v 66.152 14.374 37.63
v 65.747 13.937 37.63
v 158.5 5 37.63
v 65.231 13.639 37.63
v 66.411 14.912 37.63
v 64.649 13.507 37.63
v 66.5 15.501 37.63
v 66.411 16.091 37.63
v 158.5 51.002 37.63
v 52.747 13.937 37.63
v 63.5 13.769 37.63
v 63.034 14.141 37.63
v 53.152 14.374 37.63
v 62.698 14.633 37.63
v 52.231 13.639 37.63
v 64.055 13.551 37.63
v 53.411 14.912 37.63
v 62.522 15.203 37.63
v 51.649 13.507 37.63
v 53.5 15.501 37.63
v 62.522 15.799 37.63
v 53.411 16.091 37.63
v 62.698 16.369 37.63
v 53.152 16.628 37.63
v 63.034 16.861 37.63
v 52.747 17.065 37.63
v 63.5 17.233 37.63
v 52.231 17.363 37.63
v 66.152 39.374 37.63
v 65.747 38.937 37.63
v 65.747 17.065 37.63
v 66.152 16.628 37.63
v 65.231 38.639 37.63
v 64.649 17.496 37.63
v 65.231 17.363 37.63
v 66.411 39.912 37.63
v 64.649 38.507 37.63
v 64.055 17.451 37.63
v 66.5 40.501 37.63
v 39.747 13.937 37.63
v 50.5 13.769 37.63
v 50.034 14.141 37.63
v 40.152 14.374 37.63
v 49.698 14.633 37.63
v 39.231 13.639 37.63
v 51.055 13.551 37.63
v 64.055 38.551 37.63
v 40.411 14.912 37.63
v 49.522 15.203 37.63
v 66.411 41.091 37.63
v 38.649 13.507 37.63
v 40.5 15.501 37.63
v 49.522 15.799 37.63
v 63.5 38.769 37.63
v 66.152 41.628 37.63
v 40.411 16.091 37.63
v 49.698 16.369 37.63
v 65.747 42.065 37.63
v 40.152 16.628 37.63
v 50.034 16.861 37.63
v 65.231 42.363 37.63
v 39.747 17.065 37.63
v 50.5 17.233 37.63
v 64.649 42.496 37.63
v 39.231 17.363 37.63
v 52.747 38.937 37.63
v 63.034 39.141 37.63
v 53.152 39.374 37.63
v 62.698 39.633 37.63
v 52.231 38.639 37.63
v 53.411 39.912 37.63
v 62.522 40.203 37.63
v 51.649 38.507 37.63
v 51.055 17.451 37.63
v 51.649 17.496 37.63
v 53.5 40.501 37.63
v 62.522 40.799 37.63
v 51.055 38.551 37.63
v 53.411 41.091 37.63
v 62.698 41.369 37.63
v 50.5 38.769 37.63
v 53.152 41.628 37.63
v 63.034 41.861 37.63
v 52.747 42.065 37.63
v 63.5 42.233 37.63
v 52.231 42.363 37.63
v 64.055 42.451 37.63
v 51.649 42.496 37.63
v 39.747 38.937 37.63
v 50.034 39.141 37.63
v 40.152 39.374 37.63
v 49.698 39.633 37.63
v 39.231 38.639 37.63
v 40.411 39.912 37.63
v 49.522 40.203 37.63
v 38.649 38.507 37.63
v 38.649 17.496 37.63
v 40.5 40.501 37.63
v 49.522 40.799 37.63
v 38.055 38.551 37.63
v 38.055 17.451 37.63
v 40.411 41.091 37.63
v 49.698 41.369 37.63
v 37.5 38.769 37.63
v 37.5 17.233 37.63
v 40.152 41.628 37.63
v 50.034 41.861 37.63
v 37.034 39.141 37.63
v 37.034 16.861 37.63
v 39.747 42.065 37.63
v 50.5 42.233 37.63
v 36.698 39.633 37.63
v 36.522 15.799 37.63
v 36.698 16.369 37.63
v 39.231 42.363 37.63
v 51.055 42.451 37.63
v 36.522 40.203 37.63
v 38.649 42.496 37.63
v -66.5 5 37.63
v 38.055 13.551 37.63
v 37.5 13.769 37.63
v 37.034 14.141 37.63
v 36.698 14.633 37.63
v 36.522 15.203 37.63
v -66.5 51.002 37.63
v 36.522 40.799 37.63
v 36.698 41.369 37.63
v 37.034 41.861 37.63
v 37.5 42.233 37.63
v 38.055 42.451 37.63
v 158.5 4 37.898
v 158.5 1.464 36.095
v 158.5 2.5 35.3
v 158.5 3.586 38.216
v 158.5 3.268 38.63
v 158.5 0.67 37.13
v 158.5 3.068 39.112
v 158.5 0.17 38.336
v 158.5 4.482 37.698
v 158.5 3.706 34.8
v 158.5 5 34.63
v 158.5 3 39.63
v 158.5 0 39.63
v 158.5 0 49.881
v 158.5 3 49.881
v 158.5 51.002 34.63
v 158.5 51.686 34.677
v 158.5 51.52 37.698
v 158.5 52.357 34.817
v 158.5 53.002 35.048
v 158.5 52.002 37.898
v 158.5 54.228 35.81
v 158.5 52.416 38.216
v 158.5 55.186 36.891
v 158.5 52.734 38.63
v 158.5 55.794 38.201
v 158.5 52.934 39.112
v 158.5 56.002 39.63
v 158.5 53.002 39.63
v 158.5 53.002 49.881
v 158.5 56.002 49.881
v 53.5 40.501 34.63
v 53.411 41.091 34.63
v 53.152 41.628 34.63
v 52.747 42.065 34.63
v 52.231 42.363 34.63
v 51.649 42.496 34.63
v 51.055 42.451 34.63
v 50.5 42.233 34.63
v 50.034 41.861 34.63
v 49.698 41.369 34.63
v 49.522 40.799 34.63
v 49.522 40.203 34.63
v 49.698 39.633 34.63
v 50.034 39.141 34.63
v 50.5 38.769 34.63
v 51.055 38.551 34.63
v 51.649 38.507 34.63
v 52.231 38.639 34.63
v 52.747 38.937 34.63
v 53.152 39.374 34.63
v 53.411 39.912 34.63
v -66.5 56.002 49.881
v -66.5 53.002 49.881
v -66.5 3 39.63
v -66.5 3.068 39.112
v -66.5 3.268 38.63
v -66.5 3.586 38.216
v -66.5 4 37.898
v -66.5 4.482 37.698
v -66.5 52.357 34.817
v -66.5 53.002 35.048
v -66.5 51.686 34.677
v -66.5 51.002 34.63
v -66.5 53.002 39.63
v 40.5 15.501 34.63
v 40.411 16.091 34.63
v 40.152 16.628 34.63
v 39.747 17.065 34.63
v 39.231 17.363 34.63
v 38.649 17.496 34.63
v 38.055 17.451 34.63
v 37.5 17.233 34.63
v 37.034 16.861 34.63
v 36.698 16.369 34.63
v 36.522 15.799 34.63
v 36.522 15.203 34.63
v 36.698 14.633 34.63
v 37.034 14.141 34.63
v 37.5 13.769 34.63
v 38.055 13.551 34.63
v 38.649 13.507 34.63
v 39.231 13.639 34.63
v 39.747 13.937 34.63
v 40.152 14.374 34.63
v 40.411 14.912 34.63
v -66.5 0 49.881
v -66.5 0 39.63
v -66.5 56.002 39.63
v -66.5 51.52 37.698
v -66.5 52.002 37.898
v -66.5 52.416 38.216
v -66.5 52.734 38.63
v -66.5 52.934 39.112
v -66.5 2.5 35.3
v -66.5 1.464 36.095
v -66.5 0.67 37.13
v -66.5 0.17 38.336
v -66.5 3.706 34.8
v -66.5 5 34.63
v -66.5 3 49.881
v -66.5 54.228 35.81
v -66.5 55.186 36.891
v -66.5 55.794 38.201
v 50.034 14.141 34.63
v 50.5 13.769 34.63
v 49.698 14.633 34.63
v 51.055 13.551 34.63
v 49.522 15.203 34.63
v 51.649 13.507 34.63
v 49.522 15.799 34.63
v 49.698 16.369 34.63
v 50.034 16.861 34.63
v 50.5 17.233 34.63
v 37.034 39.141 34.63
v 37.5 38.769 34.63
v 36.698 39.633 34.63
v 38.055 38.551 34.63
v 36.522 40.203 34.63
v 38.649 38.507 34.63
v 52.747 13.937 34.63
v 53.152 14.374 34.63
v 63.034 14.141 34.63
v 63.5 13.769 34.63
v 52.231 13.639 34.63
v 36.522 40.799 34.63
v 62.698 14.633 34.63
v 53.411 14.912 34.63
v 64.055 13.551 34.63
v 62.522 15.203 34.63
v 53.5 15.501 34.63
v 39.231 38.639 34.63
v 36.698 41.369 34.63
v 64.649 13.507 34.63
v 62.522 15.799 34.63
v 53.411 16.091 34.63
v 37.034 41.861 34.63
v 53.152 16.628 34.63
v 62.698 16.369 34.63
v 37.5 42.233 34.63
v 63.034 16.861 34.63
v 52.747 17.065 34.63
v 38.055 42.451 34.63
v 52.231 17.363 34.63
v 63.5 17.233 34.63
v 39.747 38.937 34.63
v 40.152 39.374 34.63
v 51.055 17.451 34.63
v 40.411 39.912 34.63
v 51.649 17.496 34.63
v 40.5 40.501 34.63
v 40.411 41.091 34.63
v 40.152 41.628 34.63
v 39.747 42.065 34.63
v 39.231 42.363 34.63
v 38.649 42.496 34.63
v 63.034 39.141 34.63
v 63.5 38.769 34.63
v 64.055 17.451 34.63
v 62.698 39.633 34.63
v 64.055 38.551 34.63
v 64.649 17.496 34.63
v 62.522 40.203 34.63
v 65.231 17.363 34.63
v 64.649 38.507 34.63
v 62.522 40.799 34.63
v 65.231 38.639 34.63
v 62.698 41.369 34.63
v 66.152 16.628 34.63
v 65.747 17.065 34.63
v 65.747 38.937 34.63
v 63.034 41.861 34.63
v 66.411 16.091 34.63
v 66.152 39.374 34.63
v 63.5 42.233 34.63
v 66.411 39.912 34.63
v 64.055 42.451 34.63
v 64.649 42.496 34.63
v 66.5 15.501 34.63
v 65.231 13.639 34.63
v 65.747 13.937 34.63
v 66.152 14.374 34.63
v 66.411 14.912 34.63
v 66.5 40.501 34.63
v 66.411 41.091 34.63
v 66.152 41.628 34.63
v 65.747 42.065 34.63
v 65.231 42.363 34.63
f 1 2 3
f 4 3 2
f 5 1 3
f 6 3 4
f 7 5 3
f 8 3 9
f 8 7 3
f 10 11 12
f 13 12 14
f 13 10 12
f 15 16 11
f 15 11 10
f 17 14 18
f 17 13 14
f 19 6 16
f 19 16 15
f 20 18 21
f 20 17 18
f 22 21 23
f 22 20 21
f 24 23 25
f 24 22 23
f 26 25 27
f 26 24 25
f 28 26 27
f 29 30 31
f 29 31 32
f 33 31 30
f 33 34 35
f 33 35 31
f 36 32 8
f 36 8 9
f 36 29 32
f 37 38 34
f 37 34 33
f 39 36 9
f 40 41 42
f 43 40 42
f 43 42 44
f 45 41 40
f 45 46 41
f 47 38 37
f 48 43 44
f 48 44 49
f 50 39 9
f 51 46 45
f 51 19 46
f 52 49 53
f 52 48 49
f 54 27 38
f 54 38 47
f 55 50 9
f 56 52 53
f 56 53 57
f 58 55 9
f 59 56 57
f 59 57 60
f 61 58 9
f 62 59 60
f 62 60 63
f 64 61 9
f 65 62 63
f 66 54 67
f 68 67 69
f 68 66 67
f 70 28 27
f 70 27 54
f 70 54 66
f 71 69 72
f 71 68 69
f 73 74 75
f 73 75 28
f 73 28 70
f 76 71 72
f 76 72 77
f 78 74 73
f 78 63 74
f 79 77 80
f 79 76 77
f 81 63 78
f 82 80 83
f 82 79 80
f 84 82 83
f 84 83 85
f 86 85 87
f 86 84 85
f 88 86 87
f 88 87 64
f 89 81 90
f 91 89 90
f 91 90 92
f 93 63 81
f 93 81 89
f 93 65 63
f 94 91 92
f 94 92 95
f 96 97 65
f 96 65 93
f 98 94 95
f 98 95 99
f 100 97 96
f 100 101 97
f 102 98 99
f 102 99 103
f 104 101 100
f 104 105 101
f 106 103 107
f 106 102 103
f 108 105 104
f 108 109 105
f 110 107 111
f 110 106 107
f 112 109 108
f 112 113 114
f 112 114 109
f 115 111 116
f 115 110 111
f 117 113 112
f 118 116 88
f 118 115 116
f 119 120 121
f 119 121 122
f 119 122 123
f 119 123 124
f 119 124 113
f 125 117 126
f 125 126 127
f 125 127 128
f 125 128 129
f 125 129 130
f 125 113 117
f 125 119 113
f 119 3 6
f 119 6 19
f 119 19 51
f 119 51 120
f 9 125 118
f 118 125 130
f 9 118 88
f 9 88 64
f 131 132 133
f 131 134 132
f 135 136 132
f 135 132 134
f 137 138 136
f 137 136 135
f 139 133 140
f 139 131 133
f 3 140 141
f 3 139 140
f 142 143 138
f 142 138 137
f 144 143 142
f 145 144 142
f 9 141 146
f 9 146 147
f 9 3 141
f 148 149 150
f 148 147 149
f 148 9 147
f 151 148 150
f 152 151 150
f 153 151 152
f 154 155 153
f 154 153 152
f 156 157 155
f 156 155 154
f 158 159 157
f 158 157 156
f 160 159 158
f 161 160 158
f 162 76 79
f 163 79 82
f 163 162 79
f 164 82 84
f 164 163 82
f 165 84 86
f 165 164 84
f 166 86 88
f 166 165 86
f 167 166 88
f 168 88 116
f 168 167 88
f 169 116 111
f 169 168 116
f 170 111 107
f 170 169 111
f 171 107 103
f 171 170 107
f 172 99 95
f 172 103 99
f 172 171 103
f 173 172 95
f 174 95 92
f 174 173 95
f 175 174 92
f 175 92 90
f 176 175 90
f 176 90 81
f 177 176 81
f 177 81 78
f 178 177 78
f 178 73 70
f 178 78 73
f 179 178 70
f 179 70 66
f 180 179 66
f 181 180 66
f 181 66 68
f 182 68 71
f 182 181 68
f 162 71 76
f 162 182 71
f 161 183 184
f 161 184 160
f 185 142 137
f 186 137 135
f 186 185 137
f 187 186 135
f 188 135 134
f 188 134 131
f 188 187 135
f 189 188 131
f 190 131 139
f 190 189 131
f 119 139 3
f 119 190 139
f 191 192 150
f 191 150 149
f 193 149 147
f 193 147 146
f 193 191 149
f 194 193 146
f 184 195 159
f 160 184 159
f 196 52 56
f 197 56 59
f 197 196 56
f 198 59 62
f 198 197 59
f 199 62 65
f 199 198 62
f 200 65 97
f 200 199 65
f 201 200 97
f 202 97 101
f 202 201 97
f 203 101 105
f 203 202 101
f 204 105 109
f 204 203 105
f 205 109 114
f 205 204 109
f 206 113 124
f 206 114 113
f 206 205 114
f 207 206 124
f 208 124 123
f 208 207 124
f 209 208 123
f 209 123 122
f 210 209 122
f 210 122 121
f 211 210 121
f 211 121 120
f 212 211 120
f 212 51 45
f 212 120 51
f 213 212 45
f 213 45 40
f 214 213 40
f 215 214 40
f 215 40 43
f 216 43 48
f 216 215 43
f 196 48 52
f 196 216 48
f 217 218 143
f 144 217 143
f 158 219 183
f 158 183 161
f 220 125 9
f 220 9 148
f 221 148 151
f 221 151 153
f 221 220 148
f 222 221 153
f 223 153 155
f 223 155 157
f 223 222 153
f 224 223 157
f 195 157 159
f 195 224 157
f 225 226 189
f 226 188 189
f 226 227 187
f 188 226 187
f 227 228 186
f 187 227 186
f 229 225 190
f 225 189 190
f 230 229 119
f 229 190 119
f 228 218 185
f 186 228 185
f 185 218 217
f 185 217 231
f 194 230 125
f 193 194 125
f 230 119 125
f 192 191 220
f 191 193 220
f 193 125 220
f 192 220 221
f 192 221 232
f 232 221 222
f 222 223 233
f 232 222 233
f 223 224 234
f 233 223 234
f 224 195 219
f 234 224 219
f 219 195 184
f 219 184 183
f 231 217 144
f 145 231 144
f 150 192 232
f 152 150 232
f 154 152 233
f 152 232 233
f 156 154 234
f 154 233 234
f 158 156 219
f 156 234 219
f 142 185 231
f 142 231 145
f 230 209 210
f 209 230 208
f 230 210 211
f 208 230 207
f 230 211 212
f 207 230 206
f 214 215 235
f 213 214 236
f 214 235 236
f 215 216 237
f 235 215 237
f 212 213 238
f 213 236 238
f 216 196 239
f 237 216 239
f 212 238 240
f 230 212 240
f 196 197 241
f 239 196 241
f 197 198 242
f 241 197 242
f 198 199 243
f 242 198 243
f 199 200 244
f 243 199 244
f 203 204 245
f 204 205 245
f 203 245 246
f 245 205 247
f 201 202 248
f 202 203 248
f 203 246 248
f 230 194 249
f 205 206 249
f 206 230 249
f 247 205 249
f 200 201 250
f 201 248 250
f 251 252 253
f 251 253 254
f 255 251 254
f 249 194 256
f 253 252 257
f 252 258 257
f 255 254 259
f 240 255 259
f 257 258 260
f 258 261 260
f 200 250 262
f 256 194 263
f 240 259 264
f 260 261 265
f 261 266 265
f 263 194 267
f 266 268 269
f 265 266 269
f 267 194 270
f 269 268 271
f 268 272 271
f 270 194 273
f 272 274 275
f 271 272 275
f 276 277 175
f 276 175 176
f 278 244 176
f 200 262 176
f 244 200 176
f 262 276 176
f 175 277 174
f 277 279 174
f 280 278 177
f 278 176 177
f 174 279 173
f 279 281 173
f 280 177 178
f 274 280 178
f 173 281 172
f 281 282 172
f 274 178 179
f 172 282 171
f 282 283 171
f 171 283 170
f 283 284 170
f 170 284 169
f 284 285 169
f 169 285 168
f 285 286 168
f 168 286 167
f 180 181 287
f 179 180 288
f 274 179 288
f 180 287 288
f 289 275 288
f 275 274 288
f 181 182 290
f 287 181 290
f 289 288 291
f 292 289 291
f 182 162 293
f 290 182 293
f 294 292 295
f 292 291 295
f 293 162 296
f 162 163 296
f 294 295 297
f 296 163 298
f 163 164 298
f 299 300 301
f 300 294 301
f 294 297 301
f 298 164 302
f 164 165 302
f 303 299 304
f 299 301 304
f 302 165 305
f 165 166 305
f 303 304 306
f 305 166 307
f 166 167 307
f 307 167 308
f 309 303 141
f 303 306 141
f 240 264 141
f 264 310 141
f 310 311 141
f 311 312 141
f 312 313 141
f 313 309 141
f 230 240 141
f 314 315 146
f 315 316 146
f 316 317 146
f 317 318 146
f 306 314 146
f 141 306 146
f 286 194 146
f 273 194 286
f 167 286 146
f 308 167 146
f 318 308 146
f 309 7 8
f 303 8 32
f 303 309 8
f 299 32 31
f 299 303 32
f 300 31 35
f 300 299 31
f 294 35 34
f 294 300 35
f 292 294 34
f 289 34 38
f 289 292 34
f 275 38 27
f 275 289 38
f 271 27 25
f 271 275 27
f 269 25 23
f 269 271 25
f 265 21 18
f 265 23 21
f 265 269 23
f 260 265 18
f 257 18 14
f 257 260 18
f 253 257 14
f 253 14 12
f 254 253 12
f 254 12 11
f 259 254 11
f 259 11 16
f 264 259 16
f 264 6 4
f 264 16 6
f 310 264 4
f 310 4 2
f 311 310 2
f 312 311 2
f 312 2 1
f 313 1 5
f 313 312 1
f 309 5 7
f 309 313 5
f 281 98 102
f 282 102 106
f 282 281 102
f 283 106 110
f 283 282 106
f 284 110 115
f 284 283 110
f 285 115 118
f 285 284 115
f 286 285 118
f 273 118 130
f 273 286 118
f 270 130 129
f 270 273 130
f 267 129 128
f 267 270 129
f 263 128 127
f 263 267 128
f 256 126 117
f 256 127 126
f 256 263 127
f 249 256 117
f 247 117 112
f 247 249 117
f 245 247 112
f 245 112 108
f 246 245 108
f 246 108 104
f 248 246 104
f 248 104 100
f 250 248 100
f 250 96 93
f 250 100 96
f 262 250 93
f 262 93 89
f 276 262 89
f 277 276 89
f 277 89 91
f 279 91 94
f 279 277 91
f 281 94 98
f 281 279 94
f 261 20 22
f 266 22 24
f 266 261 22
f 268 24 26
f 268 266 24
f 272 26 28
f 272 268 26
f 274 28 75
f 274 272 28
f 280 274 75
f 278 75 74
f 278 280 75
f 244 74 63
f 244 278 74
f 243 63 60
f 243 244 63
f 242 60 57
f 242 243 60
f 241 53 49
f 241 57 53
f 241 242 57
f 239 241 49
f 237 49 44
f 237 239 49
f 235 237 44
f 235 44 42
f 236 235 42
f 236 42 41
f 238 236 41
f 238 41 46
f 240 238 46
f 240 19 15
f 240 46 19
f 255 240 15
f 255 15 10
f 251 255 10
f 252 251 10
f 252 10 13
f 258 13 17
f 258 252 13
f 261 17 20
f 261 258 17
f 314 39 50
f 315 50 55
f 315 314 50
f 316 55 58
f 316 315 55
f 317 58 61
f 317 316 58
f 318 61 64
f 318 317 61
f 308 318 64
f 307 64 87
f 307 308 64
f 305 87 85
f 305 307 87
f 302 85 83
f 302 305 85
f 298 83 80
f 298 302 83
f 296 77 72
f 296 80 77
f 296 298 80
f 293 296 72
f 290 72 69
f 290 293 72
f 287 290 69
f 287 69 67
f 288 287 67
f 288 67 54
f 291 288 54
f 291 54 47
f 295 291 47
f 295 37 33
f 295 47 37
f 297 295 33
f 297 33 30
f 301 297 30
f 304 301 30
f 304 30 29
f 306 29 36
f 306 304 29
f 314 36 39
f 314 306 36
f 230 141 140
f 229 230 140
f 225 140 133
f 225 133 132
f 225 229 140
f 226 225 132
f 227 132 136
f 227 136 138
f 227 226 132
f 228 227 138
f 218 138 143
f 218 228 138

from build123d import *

# Parameters (mm, degrees)
SKETCH1_W                  = 225
SKETCH1_H                  = 77.5
SKETCH1_R                  = 2
BOSS_EXTRUDE1_DEPTH        = 3
SKETCHED_START             = -27.618786464
SKETCHED_BEND1_OUTLINE_W   = 225
SKETCHED_BEND1_OUTLINE_H   = 3
SKETCHED_BEND1_DEPTH       = 62.248893571
SKETCHED_START_2           = 35.116407107
SKETCHED_BEND1_2_OUTLINE_W = 225
SKETCHED_BEND1_2_OUTLINE_H = 50.002212856
SKETCHED_BEND1_2_OUTLINE_R = 2
SKETCHED_BEND1_2_DEPTH     = 2.5137
SKETCHED_START_3           = 39.630107107
SKETCHED_BEND1_3_OUTLINE_W = 225
SKETCHED_BEND1_3_OUTLINE_H = 3
SKETCHED_BEND1_3_DEPTH     = 10.251106429
SKETCHED_START_4           = 34.630107107
SKETCHED_BEND1_4_OUTLINE_W = 225
SKETCHED_BEND1_4_OUTLINE_H = 3
SKETCHED_BEND1_4_DEPTH     = 0.28314
SKETCHED_BEND1_5_OUTLINE_W = 225
SKETCHED_BEND1_5_OUTLINE_H = 50.002212856
SKETCHED_BEND1_5_OUTLINE_R = 2
SKETCHED_BEND1_5_DEPTH     = 5
SKETCHED_START_5           = -66.5
SKETCHED_BEND1_6_DEPTH     = 225
SKETCHED_BEND1_7_DEPTH     = 225


with BuildPart() as part:
    # Sketch1 → Boss-Extrude1 (new body)
    with BuildSketch(Plane(origin=(0, 0, 0), x_dir=(1, 0, 0), z_dir=(0, 1, 0))):
        with Locations((46, -11.131213536)):
            Rectangle(SKETCH1_W, SKETCH1_H)
        with Locations(Location((38.5, 1.368786464, 0), (0, 0, 270))):
            Circle(SKETCH1_R, mode=Mode.SUBTRACT)
        with Locations(Location((38.5, -23.631213536, 0), (0, 0, 90))):
            Circle(SKETCH1_R, mode=Mode.SUBTRACT)
        with Locations(Location((51.5, 1.368786464, 0), (0, 0, 270))):
            Circle(SKETCH1_R, mode=Mode.SUBTRACT)
        with Locations(Location((51.5, -23.631213536, 0), (0, 0, 90))):
            Circle(SKETCH1_R, mode=Mode.SUBTRACT)
        with Locations(Location((64.5, 1.368786464, 0), (0, 0, 270))):
            Circle(SKETCH1_R, mode=Mode.SUBTRACT)
        with Locations(Location((64.5, -23.631213536, 0), (0, 0, 90))):
            Circle(SKETCH1_R, mode=Mode.SUBTRACT)
    extrude(amount=BOSS_EXTRUDE1_DEPTH)

    # Sketched Bend1: read off the stored shape, not the designer's step
    # Sketched Bend1 outline → Sketched Bend1 (cut)
    with BuildSketch(Plane.XY.offset(SKETCHED_START)):
        with Locations((46, 1.5)):
            Rectangle(SKETCHED_BEND1_OUTLINE_W, SKETCHED_BEND1_OUTLINE_H)
    extrude(amount=SKETCHED_BEND1_DEPTH, mode=Mode.SUBTRACT)

    # Sketched Bend1 2 outline → Sketched Bend1 2 (add)
    with BuildSketch(Plane.XY.offset(SKETCHED_START_2)):
        with Locations((46, 28.001106428)):
            Rectangle(SKETCHED_BEND1_2_OUTLINE_W, SKETCHED_BEND1_2_OUTLINE_H)
        with Locations((38.5, 15.501106428)):
            Circle(SKETCHED_BEND1_2_OUTLINE_R, mode=Mode.SUBTRACT)
        with Locations((51.5, 15.501106428)):
            Circle(SKETCHED_BEND1_2_OUTLINE_R, mode=Mode.SUBTRACT)
        with Locations((64.5, 15.501106428)):
            Circle(SKETCHED_BEND1_2_OUTLINE_R, mode=Mode.SUBTRACT)
        with Locations((38.5, 40.501106428)):
            Circle(SKETCHED_BEND1_2_OUTLINE_R, mode=Mode.SUBTRACT)
        with Locations((51.5, 40.501106428)):
            Circle(SKETCHED_BEND1_2_OUTLINE_R, mode=Mode.SUBTRACT)
        with Locations((64.5, 40.501106428)):
            Circle(SKETCHED_BEND1_2_OUTLINE_R, mode=Mode.SUBTRACT)
    extrude(amount=SKETCHED_BEND1_2_DEPTH)

    # Sketched Bend1 4 outline → Sketched Bend1 4 (cut)
    with BuildSketch(Plane.XY.offset(SKETCHED_START_4)):
        with Locations((46, 1.5)):
            Rectangle(SKETCHED_BEND1_4_OUTLINE_W, SKETCHED_BEND1_4_OUTLINE_H)
    extrude(amount=SKETCHED_BEND1_4_DEPTH, mode=Mode.SUBTRACT)



with BuildPart() as body_2:
    # Sketched Bend1 3 outline → Sketched Bend1 3 (new body)
    with BuildSketch(Plane.XY.offset(SKETCHED_START_3)):
        with Locations((46, 54.502212856)):
            Rectangle(SKETCHED_BEND1_3_OUTLINE_W, SKETCHED_BEND1_3_OUTLINE_H)
    extrude(amount=SKETCHED_BEND1_3_DEPTH)


with BuildPart() as part_1:
    add(part.part)

    add(body_2.part)  # Sketched Bend1 5 merges body 2
    # Sketched Bend1 5 outline → Sketched Bend1 5 (add)
    with BuildSketch(Plane.XY.offset(SKETCHED_START_4)):
        with Locations((46, 28.001106428)):
            Rectangle(SKETCHED_BEND1_5_OUTLINE_W, SKETCHED_BEND1_5_OUTLINE_H)
        with Locations((38.5, 15.501106428)):
            Circle(SKETCHED_BEND1_5_OUTLINE_R, mode=Mode.SUBTRACT)
        with Locations((51.5, 15.501106428)):
            Circle(SKETCHED_BEND1_5_OUTLINE_R, mode=Mode.SUBTRACT)
        with Locations((64.5, 15.501106428)):
            Circle(SKETCHED_BEND1_5_OUTLINE_R, mode=Mode.SUBTRACT)
        with Locations((38.5, 40.501106428)):
            Circle(SKETCHED_BEND1_5_OUTLINE_R, mode=Mode.SUBTRACT)
        with Locations((51.5, 40.501106428)):
            Circle(SKETCHED_BEND1_5_OUTLINE_R, mode=Mode.SUBTRACT)
        with Locations((64.5, 40.501106428)):
            Circle(SKETCHED_BEND1_5_OUTLINE_R, mode=Mode.SUBTRACT)
    extrude(amount=SKETCHED_BEND1_5_DEPTH)

    # Sketched Bend1 6 outline → Sketched Bend1 6 (cut)
    with BuildSketch(Plane.YZ.offset(SKETCHED_START_5)):
        with BuildLine():
            Line((3, 34.630107107), (5, 34.630107107))
            ThreePointArc((5, 34.630107107), (1.464466094, 36.094573201), (0, 39.630107107))
            Line((0, 39.630107107), (0, 34.913247107))
            Line((0, 34.913247107), (3, 34.913247107))
            Line((3, 34.913247107), (3, 34.630107107))
        make_face()
        with BuildLine():
            Line((53.002212856, 34.630107107), (53.002212856, 35.047531413))
            ThreePointArc((53.002212856, 35.047531413), (52.023761074, 34.735575543), (51.002212856, 34.630107107))
            Line((51.002212856, 34.630107107), (53.002212856, 34.630107107))
        make_face()
        with BuildLine():
            Line((5, 37.630107107), (51.002212856, 37.630107107))
            ThreePointArc((51.002212856, 37.630107107), (52.416426419, 38.215893545), (53.002212856, 39.630107107))
            Line((53.002212856, 39.630107107), (3, 39.630107107))
            ThreePointArc((3, 39.630107107), (3.585786438, 38.215893545), (5, 37.630107107))
        make_face()
    extrude(amount=SKETCHED_BEND1_6_DEPTH, mode=Mode.SUBTRACT)

    # Sketched Bend1 7 outline → Sketched Bend1 7 (add)
    with BuildSketch(Plane.YZ.offset(SKETCHED_START_5)):
        with BuildLine():
            Line((56.002212856, 39.630107107), (53.002212856, 39.630107107))
            Line((53.002212856, 39.630107107), (53.002212856, 35.047531413))
            ThreePointArc((53.002212856, 35.047531413), (55.185512988, 36.89149432), (56.002212856, 39.630107107))
        make_face()
    extrude(amount=SKETCHED_BEND1_7_DEPTH)


solid = part_1.part
